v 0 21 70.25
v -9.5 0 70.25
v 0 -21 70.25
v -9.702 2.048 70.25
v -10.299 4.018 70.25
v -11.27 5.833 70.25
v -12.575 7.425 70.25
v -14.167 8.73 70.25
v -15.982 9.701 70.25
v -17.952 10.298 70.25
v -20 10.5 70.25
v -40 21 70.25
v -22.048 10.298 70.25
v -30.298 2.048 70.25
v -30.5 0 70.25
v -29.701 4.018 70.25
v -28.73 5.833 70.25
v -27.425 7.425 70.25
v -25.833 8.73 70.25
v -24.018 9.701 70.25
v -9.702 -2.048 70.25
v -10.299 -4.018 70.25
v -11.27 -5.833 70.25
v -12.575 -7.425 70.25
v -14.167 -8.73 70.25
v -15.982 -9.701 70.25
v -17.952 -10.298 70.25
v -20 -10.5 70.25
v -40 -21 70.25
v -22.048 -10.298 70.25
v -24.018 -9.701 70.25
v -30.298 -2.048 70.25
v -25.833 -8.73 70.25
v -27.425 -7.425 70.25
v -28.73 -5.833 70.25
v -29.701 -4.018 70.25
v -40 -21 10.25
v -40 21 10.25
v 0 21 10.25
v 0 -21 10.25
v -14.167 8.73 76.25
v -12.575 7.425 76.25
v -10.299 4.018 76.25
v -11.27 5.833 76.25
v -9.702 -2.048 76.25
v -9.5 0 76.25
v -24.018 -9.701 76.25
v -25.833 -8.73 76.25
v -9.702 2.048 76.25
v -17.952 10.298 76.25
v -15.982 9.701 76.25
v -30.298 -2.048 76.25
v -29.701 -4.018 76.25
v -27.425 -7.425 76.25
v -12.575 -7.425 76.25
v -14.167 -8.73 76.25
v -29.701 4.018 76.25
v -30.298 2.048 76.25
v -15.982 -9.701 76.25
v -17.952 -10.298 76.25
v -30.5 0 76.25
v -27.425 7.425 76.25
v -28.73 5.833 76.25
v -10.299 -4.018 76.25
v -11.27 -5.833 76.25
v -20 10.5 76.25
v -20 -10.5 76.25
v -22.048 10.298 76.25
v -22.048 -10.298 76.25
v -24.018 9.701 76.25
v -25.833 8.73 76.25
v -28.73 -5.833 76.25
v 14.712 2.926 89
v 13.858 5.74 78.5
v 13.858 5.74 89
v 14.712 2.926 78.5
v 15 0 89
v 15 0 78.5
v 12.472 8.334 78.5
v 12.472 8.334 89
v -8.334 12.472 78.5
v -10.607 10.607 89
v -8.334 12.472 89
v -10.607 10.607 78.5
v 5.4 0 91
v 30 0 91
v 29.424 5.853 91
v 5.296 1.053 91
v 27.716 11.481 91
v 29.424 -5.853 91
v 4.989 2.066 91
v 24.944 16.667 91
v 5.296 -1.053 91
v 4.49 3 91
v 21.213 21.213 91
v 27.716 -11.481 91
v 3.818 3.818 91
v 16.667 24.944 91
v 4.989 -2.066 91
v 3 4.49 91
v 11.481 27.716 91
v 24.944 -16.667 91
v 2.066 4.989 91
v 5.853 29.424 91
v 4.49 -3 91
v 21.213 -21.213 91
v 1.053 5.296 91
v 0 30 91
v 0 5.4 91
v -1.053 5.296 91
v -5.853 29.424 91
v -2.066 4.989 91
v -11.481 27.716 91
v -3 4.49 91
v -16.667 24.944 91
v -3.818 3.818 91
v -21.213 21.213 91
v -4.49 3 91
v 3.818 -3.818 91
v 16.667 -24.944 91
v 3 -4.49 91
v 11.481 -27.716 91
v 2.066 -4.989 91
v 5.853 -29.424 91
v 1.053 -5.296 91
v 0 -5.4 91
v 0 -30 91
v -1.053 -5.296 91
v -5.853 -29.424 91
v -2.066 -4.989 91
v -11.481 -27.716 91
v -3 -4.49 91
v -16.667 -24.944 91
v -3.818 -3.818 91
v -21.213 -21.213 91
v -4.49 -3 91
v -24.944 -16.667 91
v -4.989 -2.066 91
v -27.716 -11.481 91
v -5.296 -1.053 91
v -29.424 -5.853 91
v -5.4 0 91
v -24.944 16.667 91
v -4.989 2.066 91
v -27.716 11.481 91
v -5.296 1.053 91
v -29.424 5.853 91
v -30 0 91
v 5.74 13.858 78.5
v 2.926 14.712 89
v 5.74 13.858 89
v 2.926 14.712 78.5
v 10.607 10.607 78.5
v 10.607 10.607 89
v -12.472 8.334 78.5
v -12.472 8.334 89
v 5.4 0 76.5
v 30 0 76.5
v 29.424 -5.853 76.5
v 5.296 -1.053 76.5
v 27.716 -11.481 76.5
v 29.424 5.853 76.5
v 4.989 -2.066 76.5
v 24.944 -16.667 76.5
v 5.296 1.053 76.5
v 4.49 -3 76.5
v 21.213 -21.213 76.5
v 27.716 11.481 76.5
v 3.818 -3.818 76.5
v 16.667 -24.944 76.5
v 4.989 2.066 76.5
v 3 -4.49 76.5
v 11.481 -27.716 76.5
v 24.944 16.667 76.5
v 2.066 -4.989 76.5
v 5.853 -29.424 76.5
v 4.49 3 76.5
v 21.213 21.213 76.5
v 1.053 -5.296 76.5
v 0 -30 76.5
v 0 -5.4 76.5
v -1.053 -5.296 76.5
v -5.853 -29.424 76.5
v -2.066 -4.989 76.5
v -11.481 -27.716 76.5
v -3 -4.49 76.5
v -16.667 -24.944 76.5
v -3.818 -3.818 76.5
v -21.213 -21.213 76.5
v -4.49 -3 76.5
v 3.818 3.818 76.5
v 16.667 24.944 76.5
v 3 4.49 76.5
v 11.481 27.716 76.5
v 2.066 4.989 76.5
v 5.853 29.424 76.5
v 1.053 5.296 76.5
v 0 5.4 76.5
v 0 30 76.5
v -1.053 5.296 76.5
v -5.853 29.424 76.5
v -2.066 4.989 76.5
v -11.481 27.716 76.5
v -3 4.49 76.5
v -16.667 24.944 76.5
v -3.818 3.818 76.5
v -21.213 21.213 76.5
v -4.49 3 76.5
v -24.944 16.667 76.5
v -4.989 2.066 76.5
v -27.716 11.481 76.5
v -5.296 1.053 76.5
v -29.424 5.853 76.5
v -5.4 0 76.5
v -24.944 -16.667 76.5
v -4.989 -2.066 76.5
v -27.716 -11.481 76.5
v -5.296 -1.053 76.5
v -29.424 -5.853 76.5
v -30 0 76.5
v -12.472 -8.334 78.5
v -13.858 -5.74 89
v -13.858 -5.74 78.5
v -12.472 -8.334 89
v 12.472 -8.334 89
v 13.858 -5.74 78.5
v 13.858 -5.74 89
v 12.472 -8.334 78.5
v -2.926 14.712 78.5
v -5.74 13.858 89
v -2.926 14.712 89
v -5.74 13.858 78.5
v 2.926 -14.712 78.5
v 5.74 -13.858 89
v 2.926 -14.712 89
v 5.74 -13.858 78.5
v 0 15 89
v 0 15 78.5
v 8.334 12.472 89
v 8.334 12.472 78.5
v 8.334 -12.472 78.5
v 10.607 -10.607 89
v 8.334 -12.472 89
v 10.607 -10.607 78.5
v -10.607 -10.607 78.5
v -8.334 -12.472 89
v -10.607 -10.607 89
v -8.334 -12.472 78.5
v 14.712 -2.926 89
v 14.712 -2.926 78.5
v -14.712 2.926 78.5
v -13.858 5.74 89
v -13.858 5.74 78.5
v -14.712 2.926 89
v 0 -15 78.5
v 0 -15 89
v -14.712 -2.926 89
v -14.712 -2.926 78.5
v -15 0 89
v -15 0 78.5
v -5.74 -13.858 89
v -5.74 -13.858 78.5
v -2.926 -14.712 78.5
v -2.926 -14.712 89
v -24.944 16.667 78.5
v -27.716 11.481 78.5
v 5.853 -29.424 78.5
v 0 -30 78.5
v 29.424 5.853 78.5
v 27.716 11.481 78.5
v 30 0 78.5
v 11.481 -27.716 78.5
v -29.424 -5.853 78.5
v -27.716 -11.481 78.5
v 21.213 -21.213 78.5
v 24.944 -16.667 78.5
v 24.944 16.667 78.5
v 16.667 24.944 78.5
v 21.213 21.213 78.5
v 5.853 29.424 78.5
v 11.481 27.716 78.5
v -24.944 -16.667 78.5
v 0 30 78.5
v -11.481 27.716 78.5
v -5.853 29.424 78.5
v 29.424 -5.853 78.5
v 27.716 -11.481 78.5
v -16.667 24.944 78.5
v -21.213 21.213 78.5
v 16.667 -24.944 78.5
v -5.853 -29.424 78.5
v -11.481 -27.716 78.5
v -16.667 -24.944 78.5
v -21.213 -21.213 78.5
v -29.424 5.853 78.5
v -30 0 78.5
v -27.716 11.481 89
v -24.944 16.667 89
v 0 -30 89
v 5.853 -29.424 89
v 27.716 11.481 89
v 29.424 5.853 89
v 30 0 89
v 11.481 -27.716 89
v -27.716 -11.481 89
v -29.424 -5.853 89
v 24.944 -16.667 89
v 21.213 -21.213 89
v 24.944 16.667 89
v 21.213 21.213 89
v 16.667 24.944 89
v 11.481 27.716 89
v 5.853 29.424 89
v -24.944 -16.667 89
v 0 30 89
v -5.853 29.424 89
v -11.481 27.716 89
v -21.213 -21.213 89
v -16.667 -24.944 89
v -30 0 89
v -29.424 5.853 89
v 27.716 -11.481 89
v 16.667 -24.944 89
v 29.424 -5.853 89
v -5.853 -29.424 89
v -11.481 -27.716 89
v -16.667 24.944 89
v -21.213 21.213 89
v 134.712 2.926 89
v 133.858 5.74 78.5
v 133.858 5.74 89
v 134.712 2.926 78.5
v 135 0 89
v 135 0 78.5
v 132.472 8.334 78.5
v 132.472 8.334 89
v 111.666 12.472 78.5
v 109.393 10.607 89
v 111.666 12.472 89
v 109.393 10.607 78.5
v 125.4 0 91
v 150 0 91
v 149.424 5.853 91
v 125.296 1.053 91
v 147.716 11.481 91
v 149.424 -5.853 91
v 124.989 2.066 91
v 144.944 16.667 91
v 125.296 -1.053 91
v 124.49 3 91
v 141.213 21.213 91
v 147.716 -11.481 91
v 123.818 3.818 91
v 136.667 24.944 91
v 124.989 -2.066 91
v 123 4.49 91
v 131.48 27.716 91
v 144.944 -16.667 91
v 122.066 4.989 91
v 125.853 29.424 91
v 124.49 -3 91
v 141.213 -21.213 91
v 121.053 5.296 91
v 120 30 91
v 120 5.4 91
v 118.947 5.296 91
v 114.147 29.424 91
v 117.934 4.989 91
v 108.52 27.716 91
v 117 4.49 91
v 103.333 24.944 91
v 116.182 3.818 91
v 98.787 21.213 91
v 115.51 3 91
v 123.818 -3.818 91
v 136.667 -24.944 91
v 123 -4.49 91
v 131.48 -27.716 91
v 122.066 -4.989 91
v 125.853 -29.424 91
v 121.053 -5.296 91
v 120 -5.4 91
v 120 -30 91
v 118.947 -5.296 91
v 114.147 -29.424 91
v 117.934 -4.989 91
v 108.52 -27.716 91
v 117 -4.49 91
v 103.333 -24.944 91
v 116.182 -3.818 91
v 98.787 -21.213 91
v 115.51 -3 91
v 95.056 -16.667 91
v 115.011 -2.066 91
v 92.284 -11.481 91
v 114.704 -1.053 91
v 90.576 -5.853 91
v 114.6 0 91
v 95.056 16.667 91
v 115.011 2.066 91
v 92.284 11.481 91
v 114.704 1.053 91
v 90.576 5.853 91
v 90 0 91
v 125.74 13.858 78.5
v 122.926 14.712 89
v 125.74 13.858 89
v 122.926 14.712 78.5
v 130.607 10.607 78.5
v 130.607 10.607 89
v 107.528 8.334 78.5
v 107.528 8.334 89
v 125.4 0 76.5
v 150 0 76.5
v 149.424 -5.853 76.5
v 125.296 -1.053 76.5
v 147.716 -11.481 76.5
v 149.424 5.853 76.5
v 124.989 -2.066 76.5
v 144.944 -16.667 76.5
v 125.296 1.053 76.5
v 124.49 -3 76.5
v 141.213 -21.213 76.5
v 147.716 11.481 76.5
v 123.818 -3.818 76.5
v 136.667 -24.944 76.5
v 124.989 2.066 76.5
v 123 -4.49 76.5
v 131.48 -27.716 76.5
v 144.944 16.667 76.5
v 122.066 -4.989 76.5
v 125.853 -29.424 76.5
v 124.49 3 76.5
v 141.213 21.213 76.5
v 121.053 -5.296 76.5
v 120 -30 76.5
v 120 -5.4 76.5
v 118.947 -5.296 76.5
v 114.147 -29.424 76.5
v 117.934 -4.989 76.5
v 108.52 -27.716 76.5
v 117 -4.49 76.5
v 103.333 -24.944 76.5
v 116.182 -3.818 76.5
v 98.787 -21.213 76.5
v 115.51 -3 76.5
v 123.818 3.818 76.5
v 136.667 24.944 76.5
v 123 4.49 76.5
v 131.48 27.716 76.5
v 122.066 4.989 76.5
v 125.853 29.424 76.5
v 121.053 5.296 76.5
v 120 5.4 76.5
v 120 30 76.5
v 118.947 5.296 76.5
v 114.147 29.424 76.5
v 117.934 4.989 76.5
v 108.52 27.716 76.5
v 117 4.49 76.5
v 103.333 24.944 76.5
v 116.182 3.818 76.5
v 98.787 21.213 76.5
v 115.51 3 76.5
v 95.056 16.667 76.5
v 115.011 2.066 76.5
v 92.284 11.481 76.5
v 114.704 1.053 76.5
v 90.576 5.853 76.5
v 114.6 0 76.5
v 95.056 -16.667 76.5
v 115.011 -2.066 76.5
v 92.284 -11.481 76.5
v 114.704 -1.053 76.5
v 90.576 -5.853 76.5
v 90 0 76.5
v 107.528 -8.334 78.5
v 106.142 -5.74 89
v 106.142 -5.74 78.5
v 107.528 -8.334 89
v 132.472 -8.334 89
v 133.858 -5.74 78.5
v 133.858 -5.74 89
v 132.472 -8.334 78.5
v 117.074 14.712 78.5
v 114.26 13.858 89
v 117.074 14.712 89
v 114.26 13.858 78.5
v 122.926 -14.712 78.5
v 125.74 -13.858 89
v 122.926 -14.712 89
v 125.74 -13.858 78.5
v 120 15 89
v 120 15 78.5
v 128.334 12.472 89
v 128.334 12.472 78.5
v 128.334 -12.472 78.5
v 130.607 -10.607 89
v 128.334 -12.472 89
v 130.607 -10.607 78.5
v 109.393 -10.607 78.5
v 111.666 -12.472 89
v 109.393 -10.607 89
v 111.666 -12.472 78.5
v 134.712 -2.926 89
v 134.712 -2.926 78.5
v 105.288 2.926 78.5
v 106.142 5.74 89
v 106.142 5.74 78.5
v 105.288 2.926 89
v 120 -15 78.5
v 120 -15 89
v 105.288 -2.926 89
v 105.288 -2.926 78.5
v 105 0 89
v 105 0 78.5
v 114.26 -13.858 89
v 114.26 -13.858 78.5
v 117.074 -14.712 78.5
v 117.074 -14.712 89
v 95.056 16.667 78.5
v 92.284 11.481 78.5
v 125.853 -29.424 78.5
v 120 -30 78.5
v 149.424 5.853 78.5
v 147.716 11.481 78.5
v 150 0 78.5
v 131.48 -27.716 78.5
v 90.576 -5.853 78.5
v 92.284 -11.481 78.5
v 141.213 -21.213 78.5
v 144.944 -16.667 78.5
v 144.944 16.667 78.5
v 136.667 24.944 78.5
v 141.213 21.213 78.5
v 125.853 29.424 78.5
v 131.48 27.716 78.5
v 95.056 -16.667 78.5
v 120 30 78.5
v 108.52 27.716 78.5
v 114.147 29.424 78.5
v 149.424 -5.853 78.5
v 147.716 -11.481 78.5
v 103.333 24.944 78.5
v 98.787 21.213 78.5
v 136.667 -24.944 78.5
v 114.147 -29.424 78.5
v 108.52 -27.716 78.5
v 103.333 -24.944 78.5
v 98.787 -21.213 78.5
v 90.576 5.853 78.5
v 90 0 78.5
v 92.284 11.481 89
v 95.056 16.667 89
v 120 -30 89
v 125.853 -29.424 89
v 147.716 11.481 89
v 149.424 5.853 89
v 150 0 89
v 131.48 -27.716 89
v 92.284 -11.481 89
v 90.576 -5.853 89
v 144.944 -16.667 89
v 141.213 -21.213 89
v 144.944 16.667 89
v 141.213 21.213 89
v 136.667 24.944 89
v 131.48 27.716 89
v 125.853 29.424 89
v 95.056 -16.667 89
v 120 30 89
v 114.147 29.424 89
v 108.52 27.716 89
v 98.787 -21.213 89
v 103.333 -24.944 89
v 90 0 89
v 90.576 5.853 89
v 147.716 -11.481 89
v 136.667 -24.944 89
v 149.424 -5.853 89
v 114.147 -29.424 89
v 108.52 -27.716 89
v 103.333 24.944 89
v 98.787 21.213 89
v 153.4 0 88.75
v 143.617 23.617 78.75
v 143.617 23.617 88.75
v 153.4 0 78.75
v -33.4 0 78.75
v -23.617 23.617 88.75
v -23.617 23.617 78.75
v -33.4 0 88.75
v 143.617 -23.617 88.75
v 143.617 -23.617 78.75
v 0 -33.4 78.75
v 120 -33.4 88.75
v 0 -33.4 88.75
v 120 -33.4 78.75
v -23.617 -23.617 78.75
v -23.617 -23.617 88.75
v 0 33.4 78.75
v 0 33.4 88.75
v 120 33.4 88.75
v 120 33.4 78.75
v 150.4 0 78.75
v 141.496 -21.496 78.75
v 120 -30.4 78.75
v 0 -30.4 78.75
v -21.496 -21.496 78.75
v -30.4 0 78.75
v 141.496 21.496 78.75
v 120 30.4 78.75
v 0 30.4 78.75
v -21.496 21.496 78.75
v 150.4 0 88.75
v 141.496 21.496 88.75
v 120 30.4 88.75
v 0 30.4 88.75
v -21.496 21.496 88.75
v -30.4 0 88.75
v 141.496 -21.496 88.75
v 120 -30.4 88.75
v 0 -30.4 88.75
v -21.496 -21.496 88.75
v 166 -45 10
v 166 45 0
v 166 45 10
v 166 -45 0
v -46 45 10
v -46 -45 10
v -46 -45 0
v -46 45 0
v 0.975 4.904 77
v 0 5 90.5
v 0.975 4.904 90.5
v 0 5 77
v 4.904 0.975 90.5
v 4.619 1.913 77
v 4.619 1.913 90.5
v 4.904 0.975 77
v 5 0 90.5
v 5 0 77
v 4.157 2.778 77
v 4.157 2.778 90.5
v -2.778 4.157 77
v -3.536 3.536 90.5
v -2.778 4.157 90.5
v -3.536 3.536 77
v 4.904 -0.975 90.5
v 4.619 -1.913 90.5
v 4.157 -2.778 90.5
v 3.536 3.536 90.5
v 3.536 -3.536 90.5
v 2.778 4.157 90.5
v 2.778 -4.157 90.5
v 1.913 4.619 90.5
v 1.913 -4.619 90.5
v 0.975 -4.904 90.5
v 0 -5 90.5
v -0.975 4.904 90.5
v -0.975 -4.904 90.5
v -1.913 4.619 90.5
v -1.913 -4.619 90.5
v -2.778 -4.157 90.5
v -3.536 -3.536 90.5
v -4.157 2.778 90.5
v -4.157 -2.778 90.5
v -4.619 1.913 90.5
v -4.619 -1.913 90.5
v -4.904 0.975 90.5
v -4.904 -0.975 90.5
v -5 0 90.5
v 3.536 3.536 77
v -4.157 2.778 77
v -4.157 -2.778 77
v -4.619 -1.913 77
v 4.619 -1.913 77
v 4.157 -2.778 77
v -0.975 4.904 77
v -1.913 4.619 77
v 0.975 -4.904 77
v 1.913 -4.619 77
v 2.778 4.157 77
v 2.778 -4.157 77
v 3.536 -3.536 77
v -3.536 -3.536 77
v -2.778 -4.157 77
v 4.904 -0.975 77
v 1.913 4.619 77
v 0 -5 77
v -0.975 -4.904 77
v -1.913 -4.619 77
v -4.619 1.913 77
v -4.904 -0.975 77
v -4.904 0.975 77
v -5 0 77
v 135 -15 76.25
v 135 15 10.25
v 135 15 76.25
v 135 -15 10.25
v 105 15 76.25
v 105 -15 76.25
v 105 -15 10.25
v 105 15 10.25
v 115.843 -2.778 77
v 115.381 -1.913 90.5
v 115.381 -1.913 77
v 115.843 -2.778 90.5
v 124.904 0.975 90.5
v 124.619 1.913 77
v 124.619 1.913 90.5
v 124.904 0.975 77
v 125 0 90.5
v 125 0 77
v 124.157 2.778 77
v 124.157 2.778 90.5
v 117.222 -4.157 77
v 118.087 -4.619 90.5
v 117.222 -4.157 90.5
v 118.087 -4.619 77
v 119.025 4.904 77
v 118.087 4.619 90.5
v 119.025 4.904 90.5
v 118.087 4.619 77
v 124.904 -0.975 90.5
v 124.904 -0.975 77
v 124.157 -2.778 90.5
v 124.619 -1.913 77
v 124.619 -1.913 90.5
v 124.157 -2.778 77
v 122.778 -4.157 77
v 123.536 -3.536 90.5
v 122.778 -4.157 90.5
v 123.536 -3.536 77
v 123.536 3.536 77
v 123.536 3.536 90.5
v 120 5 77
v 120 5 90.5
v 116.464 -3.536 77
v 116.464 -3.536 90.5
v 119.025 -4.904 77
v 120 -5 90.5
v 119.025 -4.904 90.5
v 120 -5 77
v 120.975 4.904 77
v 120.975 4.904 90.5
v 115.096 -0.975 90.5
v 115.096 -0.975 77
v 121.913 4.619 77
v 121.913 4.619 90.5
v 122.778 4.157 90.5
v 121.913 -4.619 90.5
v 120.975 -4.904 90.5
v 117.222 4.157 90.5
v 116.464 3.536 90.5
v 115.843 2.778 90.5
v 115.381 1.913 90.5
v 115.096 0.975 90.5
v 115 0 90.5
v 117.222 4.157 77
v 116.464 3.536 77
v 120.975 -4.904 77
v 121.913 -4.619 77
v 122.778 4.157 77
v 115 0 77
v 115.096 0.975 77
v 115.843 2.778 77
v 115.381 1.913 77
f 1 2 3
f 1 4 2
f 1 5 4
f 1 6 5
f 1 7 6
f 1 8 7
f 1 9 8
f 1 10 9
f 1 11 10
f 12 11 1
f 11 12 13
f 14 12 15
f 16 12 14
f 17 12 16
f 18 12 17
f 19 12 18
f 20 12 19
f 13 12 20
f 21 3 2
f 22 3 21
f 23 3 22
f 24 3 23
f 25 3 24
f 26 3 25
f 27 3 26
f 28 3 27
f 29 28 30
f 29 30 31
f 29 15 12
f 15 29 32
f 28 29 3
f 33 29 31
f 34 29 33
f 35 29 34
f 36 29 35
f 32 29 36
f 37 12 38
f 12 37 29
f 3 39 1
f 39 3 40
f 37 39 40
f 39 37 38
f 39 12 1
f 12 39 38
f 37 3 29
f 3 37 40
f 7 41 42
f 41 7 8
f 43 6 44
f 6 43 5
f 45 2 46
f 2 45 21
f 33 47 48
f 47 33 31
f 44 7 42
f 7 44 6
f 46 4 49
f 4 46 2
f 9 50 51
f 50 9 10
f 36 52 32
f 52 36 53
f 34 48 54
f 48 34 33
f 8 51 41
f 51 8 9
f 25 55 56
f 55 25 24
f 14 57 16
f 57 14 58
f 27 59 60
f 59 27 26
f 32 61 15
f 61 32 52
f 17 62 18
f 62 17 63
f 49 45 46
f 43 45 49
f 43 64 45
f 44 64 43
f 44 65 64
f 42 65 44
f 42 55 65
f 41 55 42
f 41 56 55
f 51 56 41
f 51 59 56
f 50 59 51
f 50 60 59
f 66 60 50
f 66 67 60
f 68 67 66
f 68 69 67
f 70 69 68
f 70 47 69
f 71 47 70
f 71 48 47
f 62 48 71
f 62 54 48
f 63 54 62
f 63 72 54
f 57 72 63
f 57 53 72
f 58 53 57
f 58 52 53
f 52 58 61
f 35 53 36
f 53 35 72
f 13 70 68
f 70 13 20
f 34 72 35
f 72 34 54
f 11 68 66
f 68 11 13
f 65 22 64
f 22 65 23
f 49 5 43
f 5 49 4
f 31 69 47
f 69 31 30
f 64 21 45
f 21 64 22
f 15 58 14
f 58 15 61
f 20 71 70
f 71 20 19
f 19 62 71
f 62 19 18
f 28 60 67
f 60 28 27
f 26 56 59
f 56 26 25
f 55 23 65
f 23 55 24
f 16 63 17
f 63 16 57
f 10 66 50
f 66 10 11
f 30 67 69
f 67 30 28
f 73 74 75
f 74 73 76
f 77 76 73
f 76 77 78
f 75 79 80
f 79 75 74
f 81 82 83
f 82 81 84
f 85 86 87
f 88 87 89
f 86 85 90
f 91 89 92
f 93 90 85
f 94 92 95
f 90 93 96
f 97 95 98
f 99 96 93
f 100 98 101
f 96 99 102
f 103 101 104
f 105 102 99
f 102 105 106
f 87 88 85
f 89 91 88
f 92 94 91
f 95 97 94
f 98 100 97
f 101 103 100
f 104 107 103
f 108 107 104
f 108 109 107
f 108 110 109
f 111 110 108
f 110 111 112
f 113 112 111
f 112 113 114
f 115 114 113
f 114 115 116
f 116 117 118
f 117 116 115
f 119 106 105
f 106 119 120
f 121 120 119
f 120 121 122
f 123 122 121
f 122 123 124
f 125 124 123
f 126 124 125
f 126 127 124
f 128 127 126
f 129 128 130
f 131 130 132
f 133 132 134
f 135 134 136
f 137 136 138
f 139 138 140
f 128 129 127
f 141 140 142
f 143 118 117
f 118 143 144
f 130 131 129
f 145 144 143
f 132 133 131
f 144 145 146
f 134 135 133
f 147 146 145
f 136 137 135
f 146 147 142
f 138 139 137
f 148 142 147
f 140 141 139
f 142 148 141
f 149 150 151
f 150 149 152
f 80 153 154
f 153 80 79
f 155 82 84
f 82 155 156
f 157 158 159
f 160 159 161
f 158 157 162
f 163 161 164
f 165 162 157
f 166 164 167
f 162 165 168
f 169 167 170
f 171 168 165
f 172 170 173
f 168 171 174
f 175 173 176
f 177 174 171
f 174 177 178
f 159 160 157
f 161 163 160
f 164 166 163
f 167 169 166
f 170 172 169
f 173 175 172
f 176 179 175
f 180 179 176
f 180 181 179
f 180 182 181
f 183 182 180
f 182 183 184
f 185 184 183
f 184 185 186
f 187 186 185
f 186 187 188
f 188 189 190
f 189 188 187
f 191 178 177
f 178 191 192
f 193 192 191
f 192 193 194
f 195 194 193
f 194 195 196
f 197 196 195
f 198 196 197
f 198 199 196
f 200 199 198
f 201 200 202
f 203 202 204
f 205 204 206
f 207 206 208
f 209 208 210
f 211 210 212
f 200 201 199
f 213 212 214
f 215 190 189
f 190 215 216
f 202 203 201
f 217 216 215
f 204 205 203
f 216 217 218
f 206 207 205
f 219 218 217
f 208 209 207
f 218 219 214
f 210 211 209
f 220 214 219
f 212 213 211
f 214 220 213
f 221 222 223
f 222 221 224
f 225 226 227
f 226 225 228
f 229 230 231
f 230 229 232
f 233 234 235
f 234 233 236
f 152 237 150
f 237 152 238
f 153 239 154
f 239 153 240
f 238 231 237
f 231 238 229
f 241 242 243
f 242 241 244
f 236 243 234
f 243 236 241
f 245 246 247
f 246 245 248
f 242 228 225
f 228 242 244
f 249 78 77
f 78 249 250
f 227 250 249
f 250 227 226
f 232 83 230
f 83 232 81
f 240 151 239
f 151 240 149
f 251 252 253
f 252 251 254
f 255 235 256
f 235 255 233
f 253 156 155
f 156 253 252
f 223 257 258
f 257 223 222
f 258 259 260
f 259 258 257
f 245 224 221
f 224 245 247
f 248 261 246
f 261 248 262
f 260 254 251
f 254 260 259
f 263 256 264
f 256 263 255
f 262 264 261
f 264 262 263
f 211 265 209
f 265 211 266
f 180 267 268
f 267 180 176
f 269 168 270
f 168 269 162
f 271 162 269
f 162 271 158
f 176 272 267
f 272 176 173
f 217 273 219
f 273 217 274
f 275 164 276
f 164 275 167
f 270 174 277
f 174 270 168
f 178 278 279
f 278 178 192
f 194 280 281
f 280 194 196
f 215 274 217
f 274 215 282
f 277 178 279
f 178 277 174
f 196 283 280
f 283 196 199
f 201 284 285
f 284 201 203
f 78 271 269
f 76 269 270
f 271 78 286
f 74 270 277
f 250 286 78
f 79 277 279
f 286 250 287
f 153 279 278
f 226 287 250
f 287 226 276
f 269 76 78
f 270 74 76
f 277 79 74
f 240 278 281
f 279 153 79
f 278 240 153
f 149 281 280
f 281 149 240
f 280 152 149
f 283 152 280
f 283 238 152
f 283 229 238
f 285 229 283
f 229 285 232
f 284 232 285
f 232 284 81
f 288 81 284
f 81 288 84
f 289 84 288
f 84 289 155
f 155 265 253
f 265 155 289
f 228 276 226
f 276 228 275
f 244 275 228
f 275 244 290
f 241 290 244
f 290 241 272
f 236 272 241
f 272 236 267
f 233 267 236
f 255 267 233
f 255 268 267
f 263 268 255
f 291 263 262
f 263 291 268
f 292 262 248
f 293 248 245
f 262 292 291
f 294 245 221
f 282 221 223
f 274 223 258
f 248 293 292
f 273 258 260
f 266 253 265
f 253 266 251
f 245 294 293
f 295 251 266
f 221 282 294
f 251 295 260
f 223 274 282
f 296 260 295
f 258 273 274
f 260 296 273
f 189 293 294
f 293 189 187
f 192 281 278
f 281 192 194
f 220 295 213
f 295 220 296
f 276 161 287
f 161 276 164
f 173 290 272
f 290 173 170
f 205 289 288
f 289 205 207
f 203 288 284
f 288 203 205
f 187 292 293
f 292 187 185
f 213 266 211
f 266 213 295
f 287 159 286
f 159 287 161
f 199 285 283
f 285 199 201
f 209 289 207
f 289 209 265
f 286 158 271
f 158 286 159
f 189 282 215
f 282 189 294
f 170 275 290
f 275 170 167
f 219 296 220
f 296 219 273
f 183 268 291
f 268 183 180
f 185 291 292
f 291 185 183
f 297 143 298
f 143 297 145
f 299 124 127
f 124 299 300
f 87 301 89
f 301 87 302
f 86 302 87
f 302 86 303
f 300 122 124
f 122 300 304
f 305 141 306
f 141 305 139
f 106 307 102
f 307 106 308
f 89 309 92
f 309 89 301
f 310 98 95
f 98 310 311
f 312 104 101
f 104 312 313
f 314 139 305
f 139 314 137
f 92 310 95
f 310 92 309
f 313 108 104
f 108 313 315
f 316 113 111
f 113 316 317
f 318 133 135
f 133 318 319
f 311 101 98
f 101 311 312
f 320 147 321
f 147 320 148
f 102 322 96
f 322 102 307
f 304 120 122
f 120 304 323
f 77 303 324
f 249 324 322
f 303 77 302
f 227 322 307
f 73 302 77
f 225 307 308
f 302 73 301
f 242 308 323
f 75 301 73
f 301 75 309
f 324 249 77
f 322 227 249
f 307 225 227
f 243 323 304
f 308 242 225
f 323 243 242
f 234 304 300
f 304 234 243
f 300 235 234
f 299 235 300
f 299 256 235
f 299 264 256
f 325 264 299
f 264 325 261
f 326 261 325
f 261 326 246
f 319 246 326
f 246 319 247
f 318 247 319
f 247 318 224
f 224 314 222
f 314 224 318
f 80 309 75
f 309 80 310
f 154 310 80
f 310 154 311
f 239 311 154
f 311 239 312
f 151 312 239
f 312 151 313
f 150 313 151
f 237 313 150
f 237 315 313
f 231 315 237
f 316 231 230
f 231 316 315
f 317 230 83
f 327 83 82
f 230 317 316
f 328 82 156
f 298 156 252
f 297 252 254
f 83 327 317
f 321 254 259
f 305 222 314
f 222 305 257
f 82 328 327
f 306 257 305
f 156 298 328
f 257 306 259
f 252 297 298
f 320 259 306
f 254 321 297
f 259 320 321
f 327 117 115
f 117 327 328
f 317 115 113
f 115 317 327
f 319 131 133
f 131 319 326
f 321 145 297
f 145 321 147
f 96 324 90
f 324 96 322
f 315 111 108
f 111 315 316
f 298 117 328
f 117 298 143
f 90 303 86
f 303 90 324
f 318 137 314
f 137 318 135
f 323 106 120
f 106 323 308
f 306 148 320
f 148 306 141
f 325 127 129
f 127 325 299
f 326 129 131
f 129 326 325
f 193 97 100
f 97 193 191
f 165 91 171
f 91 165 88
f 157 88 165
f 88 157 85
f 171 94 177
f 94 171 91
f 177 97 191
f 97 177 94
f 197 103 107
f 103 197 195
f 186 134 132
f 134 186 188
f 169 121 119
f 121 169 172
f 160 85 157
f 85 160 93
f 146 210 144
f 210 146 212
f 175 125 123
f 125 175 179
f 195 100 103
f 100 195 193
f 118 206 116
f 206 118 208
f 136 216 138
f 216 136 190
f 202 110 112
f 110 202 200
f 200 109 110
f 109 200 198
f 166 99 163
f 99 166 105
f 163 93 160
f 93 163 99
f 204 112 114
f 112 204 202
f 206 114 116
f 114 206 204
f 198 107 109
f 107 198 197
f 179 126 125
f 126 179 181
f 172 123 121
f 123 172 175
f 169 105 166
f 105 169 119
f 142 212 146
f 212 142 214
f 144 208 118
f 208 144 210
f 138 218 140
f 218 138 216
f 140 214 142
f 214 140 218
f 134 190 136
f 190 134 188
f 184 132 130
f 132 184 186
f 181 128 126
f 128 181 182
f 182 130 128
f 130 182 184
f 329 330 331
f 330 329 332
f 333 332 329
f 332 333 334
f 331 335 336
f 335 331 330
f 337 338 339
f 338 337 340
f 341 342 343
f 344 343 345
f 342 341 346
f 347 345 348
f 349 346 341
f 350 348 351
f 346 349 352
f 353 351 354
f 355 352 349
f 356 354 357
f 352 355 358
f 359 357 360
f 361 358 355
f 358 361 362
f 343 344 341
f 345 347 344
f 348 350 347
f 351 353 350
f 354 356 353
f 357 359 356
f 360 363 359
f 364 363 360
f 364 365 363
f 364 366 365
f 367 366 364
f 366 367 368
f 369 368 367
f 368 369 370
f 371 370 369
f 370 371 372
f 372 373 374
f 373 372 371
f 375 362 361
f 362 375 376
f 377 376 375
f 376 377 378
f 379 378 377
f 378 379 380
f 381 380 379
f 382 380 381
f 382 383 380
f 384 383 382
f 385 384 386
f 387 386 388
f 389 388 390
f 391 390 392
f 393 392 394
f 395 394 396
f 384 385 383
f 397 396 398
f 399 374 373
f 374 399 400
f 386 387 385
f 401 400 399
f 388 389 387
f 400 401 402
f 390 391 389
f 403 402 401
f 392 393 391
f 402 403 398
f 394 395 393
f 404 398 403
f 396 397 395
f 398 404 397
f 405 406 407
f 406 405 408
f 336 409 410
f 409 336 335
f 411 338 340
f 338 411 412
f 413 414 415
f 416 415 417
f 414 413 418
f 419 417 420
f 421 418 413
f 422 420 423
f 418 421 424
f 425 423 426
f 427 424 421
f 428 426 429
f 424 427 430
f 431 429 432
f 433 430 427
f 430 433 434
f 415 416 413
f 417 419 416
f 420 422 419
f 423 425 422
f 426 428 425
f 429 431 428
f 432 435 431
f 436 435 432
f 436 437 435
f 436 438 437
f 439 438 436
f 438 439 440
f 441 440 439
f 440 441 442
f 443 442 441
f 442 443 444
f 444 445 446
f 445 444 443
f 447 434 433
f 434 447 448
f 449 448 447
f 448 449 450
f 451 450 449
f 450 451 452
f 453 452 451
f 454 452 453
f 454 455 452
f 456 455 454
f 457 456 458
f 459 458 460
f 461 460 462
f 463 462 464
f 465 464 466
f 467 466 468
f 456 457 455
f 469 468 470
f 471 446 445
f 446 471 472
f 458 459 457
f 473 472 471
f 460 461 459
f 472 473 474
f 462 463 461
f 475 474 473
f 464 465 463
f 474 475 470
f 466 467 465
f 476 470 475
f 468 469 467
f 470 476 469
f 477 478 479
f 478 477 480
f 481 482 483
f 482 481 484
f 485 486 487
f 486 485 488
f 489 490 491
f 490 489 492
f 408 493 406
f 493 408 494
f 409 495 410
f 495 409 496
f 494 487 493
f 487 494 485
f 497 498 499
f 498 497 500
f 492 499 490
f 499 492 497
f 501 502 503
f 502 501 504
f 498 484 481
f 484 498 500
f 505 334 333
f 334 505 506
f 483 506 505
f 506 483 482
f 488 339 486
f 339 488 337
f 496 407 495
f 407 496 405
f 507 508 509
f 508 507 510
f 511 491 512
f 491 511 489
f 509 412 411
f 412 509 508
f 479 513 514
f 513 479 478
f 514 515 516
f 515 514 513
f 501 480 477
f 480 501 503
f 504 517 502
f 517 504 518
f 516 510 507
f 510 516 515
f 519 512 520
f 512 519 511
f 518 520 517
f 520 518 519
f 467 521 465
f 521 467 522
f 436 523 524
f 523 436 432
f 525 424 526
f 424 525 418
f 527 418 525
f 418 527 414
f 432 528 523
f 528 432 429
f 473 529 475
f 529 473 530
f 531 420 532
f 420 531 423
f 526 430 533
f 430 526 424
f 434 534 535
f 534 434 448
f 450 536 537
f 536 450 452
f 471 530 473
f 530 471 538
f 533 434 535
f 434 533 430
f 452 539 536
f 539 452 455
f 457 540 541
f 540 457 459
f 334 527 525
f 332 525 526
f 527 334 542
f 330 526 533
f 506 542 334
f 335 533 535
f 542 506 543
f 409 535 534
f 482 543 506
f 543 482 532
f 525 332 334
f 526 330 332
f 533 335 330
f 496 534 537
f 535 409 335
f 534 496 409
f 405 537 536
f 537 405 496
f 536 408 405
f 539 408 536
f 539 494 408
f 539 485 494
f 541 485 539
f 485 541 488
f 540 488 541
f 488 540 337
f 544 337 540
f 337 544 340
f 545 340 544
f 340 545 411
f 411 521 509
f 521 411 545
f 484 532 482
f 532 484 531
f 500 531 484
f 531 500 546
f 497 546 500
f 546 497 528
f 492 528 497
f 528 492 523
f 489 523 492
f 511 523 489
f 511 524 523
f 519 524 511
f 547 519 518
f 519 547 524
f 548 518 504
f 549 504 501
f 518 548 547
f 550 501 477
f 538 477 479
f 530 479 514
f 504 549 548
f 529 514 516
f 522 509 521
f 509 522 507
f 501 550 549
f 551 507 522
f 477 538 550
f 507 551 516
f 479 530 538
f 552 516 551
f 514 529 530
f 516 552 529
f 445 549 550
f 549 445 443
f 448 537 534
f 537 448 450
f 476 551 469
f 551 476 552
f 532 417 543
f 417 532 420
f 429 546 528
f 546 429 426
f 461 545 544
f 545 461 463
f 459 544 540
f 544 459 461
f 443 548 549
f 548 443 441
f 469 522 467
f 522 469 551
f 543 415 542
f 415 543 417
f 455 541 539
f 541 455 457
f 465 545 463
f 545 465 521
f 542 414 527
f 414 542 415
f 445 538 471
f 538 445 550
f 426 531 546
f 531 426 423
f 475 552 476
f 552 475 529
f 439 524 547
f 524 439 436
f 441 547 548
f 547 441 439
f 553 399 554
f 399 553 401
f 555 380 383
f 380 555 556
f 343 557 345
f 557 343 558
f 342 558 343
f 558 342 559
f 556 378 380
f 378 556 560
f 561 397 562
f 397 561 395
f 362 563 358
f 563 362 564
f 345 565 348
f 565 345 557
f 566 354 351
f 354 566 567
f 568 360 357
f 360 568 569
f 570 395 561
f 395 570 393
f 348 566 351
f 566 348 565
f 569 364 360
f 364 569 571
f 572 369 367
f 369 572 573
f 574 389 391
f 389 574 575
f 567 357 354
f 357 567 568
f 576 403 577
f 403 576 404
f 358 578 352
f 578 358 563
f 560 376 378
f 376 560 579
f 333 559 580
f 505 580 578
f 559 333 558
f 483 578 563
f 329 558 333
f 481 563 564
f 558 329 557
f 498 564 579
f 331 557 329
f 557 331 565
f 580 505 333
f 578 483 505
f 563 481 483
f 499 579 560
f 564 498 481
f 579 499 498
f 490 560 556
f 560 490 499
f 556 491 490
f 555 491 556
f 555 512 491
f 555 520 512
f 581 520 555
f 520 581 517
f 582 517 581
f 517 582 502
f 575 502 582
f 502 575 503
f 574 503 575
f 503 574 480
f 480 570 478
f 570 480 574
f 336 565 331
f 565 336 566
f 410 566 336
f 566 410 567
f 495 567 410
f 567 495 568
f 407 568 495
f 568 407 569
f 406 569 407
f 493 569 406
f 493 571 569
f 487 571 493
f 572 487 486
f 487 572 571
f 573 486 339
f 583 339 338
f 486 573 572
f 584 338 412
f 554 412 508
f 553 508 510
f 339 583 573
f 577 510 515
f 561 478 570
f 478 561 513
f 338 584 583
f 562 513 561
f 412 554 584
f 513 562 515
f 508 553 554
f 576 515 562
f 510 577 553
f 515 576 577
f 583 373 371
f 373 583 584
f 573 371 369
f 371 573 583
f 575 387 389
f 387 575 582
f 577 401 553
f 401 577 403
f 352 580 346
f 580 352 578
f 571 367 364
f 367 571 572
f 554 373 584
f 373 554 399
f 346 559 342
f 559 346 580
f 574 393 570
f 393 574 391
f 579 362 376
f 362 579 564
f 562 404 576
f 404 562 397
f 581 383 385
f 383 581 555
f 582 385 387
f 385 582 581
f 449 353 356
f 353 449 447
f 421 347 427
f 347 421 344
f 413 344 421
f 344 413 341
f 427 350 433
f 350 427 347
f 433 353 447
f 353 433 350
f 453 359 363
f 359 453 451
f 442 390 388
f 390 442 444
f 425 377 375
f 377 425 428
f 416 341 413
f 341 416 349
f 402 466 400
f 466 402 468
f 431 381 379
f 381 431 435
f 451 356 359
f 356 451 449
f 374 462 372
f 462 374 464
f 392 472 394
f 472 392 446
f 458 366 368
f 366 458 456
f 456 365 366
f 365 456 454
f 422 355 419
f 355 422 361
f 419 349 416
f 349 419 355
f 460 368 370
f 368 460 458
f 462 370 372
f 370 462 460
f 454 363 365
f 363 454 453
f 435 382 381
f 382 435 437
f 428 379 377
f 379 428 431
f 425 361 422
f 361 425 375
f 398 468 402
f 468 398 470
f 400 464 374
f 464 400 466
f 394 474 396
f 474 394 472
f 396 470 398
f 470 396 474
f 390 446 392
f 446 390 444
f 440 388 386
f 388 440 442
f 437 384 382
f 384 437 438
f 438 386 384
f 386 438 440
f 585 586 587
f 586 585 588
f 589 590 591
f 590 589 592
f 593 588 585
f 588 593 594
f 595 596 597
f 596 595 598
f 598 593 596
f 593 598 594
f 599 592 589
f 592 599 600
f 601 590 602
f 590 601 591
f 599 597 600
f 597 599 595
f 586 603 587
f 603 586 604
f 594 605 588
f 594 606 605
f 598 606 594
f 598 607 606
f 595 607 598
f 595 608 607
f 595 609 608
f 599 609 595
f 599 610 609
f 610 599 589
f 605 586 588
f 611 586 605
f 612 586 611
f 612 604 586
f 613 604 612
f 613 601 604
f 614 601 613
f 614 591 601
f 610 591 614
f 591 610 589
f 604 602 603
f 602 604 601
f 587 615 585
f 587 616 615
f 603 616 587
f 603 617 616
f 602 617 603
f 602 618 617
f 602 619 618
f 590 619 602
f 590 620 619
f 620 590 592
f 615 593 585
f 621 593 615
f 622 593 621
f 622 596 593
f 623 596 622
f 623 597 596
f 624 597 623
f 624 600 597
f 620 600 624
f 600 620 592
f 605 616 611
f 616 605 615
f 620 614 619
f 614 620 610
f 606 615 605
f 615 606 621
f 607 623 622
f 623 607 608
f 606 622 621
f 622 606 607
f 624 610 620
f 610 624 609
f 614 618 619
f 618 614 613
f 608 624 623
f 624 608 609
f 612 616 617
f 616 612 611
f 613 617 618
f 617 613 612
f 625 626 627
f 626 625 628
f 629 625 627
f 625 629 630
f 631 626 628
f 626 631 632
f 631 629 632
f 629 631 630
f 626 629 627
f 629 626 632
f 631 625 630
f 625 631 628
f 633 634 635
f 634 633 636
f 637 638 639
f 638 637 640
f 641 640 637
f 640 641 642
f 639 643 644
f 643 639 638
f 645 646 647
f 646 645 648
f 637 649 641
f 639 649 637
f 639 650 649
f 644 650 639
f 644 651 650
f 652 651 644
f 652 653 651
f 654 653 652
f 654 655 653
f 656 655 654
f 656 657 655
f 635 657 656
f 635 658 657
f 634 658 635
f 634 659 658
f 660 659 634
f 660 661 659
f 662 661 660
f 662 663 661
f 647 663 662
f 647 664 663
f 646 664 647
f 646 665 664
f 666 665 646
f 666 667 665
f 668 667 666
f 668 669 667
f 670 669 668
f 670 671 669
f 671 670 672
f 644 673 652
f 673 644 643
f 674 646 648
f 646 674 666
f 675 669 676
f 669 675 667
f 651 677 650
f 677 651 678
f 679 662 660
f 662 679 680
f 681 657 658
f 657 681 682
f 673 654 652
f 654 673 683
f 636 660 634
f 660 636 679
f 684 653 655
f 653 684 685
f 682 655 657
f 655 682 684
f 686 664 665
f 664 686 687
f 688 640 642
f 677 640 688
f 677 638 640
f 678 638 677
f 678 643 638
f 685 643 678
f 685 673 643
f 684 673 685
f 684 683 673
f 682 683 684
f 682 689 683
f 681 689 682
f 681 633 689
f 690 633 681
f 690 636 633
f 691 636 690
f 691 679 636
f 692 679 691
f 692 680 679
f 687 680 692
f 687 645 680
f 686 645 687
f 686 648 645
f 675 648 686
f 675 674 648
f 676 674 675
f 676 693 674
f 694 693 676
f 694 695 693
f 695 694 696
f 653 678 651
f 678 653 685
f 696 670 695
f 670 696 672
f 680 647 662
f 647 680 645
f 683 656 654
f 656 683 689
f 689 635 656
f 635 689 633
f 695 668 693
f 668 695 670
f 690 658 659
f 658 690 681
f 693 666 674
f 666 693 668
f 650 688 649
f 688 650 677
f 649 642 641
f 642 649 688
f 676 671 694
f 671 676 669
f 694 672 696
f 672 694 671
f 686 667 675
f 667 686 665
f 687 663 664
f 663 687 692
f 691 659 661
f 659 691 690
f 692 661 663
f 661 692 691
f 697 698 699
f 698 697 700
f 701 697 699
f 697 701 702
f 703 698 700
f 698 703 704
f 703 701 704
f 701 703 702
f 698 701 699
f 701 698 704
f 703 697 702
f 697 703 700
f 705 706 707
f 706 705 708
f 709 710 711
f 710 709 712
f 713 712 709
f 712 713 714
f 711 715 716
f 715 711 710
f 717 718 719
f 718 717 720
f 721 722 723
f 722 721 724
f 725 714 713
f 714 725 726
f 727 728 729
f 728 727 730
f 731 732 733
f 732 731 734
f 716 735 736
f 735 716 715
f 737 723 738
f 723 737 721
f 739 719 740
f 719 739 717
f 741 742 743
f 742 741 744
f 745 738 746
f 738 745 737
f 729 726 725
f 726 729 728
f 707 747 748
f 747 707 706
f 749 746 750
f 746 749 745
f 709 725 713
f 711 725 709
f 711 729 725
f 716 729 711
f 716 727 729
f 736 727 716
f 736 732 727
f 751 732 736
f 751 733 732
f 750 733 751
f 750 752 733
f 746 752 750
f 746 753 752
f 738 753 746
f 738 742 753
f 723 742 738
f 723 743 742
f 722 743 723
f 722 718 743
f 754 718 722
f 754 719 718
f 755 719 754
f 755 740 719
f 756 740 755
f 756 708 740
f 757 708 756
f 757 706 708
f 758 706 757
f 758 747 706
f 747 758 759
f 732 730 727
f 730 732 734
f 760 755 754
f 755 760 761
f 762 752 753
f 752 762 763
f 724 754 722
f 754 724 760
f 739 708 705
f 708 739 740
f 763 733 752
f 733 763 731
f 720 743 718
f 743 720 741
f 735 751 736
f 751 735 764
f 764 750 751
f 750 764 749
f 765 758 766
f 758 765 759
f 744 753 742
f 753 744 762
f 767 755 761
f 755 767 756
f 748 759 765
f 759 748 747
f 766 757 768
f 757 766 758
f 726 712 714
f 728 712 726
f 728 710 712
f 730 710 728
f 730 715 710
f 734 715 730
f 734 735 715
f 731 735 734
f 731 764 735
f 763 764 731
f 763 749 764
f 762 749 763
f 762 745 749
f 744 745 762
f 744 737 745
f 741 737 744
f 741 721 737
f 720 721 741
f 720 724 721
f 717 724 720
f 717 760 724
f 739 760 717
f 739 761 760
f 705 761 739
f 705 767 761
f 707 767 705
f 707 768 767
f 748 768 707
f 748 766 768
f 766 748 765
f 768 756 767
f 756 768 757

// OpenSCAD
$fn = 32;

// ------------------------------------------------------------------------
// Motor belt drive: span 120 mm, pulleys d60, belt 10 mm wide
// Every part is its own module, assembly() places every instance.
// ------------------------------------------------------------------------

// --- part 1 ---
module base_plate() {
  difference() {
    translate([-106, -45, 0]) cube([212, 90, 10]);
  }
}

// --- part 2 ---
module motor() {
  union() {
    translate([-30, -21, 0]) cube([60, 42, 40]);
    translate([33, 0, 20]) rotate([0, 90, 0]) cylinder(h = 6, d = 21, center = true);
  }
}

// --- part 3 ---
module drive_shaft() {
  translate([0, 0, -6.75]) cylinder(h = 13.5, d = 10);
}

// --- part 4 ---
module pulley_drive() {
  difference() {
    union() {
      cylinder(h = 14.5, d = 30);
      cylinder(h = 2, d = 60);
      translate([0, 0, 12.5]) cylinder(h = 2, d = 60);
    }
    translate([0, 0, -1]) cylinder(h = 16.5, d = 10.8);
  }
}

// --- part 5 ---
module idler_post() {
  translate([-15, -15, 0]) cube([30, 30, 66]);
}

// --- part 6 ---
module driven_shaft() {
  translate([0, 0, -6.75]) cylinder(h = 13.5, d = 10);
}

// --- part 7 ---
module pulley_driven() {
  difference() {
    union() {
      cylinder(h = 14.5, d = 30);
      cylinder(h = 2, d = 60);
      translate([0, 0, 12.5]) cylinder(h = 2, d = 60);
    }
    translate([0, 0, -1]) cylinder(h = 16.5, d = 10.8);
  }
}

// --- part 8 ---
module drive_belt() {
  difference() {
    linear_extrude(height = 10) polygon(points = concat([for (a = [90 : 45 : 270]) [33.4 * cos(a), 33.4 * sin(a)]], [for (a = [270 : 45 : 450]) [120 + 33.4 * cos(a), 33.4 * sin(a)]]));
    translate([0, 0, -1]) linear_extrude(height = 12) polygon(points = concat([for (a = [90 : 45 : 270]) [30.4 * cos(a), 30.4 * sin(a)]], [for (a = [270 : 45 : 450]) [120 + 30.4 * cos(a), 30.4 * sin(a)]]));
  }
}

// --- assembly ---
module assembly() {
  color([0.80, 0.24, 0.20]) translate([60, 0, 0]) rotate([0, 0, 0]) base_plate();
  color([0.20, 0.45, 0.75]) translate([0, 0, 40.25]) rotate([0, 270, 0]) motor();
  color([0.25, 0.62, 0.32]) translate([0, 0, 83.75]) rotate([0, 0, 0]) drive_shaft();
  color([0.92, 0.70, 0.18]) translate([0, 0, 76.5]) rotate([0, 0, 0]) pulley_drive();
  color([0.58, 0.35, 0.70]) translate([120, 0, 10.25]) rotate([0, 0, 0]) idler_post();
  color([0.16, 0.66, 0.66]) translate([120, 0, 83.75]) rotate([0, 0, 0]) driven_shaft();
  color([0.85, 0.48, 0.18]) translate([120, 0, 76.5]) rotate([0, 0, 0]) pulley_driven();
  color([0.55, 0.60, 0.65]) translate([0, 0, 78.75]) rotate([0, 0, 0]) drive_belt();
}

assembly();
